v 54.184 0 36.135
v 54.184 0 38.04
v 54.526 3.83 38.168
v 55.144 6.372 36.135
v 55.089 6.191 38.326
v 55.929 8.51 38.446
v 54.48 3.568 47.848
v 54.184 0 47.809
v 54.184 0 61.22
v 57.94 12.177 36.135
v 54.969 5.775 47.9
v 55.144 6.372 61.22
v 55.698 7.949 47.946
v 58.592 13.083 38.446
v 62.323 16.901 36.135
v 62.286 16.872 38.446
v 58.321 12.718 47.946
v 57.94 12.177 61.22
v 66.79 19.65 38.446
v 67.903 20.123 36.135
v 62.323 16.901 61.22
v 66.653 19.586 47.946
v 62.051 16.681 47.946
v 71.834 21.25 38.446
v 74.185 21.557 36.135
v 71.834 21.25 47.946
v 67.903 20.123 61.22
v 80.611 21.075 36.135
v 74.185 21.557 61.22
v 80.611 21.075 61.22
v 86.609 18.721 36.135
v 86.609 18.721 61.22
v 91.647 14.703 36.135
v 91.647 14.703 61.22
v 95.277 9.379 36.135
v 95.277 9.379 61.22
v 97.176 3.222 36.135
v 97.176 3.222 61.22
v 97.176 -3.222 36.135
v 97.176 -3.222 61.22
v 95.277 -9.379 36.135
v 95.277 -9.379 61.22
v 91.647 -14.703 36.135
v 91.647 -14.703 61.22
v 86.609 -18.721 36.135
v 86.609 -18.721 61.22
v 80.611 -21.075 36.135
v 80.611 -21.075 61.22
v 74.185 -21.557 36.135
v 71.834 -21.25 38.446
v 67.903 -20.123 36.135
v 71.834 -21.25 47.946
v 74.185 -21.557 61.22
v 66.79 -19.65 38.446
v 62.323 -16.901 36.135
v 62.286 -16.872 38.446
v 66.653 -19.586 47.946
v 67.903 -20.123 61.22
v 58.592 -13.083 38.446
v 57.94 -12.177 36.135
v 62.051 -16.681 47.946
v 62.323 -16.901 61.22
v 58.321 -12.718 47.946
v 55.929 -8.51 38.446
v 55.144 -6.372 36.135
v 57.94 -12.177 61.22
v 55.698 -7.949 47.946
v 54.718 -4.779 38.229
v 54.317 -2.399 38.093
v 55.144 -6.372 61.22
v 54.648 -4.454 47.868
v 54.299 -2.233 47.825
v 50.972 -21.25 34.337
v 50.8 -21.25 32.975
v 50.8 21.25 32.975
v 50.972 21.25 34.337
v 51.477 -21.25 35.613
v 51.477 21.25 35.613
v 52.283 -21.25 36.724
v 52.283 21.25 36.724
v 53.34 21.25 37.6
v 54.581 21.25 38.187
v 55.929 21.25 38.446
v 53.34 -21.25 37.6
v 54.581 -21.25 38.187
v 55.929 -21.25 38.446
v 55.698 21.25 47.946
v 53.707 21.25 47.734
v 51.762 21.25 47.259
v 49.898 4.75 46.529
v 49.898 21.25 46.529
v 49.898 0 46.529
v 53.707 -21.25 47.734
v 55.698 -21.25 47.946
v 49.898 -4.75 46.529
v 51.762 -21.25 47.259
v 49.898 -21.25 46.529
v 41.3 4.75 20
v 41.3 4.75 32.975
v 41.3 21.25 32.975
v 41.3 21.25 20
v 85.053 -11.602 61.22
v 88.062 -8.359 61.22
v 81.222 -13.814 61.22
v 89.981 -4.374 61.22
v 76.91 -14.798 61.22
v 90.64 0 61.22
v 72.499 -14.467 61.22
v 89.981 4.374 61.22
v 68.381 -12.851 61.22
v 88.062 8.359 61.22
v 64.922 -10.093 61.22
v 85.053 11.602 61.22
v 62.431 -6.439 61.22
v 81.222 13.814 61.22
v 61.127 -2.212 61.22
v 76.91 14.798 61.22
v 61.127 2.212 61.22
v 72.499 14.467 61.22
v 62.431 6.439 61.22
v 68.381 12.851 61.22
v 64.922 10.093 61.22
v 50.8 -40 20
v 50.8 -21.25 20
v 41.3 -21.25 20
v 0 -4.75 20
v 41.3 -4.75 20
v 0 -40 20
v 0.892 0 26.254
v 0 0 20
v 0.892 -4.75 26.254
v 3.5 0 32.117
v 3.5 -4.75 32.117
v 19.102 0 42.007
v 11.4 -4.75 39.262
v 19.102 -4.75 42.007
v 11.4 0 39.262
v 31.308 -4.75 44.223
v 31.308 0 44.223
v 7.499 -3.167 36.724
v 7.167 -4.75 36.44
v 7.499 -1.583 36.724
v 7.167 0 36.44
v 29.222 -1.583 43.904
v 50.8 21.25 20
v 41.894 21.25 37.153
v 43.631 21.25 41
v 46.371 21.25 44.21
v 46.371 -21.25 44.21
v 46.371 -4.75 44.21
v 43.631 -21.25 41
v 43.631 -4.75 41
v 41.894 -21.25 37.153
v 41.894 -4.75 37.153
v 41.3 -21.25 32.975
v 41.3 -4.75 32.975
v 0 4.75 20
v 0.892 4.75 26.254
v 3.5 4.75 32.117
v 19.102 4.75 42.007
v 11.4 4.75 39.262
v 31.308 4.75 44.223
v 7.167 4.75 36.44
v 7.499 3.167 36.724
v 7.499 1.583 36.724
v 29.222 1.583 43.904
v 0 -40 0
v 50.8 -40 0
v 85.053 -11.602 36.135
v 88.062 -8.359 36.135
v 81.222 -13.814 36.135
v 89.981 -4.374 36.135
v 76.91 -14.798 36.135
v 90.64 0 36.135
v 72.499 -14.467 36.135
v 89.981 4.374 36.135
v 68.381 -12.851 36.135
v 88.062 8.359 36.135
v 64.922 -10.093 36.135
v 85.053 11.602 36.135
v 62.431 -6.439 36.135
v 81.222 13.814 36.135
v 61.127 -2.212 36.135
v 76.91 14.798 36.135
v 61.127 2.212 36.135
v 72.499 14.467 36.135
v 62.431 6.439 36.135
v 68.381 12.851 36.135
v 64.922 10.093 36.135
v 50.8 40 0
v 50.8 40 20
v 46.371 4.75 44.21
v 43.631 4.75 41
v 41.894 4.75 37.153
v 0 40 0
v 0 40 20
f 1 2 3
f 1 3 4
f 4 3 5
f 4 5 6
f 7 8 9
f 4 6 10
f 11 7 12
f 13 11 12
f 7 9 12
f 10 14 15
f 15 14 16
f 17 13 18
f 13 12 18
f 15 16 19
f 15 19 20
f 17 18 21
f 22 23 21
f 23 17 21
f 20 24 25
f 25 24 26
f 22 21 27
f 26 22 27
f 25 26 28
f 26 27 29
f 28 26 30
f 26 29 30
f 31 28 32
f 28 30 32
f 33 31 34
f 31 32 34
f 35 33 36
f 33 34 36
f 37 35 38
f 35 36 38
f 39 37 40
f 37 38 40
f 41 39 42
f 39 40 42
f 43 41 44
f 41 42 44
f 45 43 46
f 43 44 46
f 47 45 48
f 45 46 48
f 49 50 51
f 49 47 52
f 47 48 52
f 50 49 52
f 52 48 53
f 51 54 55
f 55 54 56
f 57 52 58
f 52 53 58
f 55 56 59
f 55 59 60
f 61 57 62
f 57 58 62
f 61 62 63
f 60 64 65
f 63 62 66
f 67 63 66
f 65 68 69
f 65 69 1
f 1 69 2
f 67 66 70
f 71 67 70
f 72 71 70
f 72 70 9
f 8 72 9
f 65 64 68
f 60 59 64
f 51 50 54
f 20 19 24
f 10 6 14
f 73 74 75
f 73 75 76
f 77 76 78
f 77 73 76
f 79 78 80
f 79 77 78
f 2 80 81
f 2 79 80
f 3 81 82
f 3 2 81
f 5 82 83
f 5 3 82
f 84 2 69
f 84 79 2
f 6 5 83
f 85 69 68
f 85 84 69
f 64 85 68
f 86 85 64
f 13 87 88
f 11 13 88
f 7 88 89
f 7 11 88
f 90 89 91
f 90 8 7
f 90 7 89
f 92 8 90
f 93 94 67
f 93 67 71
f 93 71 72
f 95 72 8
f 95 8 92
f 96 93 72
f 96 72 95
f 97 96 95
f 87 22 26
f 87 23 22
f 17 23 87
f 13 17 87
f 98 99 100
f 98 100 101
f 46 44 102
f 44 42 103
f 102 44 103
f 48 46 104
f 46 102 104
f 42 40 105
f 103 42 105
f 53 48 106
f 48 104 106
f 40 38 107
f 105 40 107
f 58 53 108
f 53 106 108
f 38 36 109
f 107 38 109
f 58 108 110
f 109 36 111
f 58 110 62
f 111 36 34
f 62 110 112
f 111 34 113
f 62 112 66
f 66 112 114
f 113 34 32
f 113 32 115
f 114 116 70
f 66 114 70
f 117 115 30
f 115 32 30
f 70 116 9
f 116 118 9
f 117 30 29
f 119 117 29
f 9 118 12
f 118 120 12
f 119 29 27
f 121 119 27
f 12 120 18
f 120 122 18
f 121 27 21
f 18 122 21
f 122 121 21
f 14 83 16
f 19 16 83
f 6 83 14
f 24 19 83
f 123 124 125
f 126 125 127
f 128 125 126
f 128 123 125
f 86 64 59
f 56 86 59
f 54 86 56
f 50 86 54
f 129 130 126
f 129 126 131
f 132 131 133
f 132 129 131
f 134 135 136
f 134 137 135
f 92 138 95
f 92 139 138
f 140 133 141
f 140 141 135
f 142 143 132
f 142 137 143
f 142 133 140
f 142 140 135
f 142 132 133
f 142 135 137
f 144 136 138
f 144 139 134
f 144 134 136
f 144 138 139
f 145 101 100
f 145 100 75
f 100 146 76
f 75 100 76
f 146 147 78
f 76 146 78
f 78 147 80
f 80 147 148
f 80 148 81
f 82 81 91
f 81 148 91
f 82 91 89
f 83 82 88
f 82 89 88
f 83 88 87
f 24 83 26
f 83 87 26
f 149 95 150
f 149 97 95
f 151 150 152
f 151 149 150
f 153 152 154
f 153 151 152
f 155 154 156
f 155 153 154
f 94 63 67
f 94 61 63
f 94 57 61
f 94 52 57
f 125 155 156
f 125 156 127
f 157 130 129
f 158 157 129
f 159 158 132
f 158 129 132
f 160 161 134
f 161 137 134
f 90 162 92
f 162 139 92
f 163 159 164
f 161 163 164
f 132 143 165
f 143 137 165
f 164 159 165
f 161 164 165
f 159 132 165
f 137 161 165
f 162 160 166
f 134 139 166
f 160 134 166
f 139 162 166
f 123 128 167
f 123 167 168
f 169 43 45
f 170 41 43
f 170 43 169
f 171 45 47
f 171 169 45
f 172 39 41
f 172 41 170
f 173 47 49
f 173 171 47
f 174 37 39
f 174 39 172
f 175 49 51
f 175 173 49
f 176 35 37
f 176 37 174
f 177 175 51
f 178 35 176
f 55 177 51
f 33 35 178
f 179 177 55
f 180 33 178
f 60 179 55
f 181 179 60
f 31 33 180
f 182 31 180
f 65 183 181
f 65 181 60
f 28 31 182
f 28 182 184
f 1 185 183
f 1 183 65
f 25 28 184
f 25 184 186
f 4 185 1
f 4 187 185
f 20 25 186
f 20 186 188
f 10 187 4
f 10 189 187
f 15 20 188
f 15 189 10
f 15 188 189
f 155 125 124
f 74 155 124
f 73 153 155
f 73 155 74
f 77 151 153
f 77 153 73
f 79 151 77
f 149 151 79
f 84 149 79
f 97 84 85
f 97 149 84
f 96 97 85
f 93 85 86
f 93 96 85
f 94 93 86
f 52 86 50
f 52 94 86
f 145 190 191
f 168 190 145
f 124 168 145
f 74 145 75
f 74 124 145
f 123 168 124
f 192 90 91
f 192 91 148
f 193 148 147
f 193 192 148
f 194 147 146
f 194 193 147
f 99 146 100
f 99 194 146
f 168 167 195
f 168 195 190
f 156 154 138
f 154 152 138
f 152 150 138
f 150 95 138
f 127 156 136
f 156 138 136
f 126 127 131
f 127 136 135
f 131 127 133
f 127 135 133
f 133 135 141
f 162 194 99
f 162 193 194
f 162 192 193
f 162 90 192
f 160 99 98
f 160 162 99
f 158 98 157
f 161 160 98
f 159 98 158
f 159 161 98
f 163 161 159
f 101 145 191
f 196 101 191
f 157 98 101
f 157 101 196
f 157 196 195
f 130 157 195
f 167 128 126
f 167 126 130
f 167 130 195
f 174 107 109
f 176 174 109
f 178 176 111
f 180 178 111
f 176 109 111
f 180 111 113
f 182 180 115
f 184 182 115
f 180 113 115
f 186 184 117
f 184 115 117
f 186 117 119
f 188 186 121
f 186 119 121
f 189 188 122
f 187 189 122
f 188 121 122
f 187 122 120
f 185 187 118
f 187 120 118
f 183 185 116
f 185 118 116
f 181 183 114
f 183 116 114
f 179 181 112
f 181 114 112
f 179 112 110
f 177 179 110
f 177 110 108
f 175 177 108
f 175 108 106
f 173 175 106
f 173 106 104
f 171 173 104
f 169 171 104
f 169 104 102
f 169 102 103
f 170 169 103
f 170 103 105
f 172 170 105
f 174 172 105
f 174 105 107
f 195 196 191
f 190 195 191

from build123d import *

# Parameters (mm, degrees)
F1_DEPTH = 40
F0_W     = 16.6528351631
F0_H     = 9.5000012398
F2_DEPTH = 21.25
F3_DEPTH = 4.75
F4_W     = 21.616961807
F4_H     = 25.0849984586
F6_R     = 14.8395372195
F7_DEPTH = 61.2207443843


with BuildPart() as f1:
    # F0 (on Front) → F1 (new body, symmetric)
    with BuildSketch(Plane.XZ):
        Polygon((41.2999987602, 20), (0, 20), (0, 0), (50.8, 0), (50.8, 20), align=None)
    extrude(amount=F1_DEPTH, both=True)

    # F0 (on Front) → F2 (join, symmetric)
    with BuildSketch(Plane.XZ):
        with BuildLine():
            Line((41.2999987602, 32.9745605347), (41.2999987602, 20))
            Line((41.2999987602, 20), (50.8, 20))
            Line((50.8, 20), (50.8, 32.9745605347))
            ThreePointArc((50.8, 32.9745605347), (52.2828290923, 36.7243488741), (55.9292304386, 38.4458168319))
            Line((55.9292304386, 38.4458168319), (59.3774616718, 38.4458168319))
            Line((59.3774616718, 38.4458168319), (59.3774616718, 47.9458180717))
            Line((59.3774616718, 47.9458180717), (55.6982133685, 47.9458180717))
            ThreePointArc((55.6982133685, 47.9458180717), (52.7267880944, 47.529144235), (49.8979743732, 46.5287452266))
            ThreePointArc((49.8979743732, 46.5287452266), (43.6307882116, 41.000161872), (41.2999987602, 32.9745605347))
        make_face()
        with Locations((67.7038792534, 43.1958174518)):
            Rectangle(F0_W, F0_H)
    extrude(amount=F2_DEPTH, both=True)

    # F0 (on Front) → F3 (join, symmetric)
    with BuildSketch(Plane.XZ):
        with BuildLine():
            add(Edge.make_bspline(
                [(0, 20), (0, 26.1283031877), (5.5940842359, 39.9914167736), (28.9335310701, 43.9900934342), (44.6188528976, 46.1604342678), (49.8979743732, 46.5287452266)],
                knots=[0, 0, 0, 0, 0.31410828, 0.6650486398, 1, 1, 1, 1], degree=3))
            Line((0, 20), (41.2999987602, 20))
            Line((41.2999987602, 20), (41.2999987602, 32.9745605347))
            ThreePointArc((41.2999987602, 32.9745605347), (43.6307882116, 41.000161872), (49.8979743732, 46.5287452266))
        make_face()
    extrude(amount=F3_DEPTH, both=True)

    # F4 (on Front) → F5 (revolve)
    with BuildSketch(Plane.XZ):
        with Locations((64.9921540171, 48.677245155)):
            Rectangle(F4_W, F4_H)
    revolve(axis=Axis((75.8006349206, 0, 48.677245155), (0, 0, -1)))

    # F6 (on face) → F7 (cut, through all)
    with BuildSketch(Plane.XY.offset(61.2197443843)):
        with Locations((75.8006349206, 0)):
            Circle(F6_R)
    extrude(amount=-F7_DEPTH, mode=Mode.SUBTRACT)


solid = f1.part
